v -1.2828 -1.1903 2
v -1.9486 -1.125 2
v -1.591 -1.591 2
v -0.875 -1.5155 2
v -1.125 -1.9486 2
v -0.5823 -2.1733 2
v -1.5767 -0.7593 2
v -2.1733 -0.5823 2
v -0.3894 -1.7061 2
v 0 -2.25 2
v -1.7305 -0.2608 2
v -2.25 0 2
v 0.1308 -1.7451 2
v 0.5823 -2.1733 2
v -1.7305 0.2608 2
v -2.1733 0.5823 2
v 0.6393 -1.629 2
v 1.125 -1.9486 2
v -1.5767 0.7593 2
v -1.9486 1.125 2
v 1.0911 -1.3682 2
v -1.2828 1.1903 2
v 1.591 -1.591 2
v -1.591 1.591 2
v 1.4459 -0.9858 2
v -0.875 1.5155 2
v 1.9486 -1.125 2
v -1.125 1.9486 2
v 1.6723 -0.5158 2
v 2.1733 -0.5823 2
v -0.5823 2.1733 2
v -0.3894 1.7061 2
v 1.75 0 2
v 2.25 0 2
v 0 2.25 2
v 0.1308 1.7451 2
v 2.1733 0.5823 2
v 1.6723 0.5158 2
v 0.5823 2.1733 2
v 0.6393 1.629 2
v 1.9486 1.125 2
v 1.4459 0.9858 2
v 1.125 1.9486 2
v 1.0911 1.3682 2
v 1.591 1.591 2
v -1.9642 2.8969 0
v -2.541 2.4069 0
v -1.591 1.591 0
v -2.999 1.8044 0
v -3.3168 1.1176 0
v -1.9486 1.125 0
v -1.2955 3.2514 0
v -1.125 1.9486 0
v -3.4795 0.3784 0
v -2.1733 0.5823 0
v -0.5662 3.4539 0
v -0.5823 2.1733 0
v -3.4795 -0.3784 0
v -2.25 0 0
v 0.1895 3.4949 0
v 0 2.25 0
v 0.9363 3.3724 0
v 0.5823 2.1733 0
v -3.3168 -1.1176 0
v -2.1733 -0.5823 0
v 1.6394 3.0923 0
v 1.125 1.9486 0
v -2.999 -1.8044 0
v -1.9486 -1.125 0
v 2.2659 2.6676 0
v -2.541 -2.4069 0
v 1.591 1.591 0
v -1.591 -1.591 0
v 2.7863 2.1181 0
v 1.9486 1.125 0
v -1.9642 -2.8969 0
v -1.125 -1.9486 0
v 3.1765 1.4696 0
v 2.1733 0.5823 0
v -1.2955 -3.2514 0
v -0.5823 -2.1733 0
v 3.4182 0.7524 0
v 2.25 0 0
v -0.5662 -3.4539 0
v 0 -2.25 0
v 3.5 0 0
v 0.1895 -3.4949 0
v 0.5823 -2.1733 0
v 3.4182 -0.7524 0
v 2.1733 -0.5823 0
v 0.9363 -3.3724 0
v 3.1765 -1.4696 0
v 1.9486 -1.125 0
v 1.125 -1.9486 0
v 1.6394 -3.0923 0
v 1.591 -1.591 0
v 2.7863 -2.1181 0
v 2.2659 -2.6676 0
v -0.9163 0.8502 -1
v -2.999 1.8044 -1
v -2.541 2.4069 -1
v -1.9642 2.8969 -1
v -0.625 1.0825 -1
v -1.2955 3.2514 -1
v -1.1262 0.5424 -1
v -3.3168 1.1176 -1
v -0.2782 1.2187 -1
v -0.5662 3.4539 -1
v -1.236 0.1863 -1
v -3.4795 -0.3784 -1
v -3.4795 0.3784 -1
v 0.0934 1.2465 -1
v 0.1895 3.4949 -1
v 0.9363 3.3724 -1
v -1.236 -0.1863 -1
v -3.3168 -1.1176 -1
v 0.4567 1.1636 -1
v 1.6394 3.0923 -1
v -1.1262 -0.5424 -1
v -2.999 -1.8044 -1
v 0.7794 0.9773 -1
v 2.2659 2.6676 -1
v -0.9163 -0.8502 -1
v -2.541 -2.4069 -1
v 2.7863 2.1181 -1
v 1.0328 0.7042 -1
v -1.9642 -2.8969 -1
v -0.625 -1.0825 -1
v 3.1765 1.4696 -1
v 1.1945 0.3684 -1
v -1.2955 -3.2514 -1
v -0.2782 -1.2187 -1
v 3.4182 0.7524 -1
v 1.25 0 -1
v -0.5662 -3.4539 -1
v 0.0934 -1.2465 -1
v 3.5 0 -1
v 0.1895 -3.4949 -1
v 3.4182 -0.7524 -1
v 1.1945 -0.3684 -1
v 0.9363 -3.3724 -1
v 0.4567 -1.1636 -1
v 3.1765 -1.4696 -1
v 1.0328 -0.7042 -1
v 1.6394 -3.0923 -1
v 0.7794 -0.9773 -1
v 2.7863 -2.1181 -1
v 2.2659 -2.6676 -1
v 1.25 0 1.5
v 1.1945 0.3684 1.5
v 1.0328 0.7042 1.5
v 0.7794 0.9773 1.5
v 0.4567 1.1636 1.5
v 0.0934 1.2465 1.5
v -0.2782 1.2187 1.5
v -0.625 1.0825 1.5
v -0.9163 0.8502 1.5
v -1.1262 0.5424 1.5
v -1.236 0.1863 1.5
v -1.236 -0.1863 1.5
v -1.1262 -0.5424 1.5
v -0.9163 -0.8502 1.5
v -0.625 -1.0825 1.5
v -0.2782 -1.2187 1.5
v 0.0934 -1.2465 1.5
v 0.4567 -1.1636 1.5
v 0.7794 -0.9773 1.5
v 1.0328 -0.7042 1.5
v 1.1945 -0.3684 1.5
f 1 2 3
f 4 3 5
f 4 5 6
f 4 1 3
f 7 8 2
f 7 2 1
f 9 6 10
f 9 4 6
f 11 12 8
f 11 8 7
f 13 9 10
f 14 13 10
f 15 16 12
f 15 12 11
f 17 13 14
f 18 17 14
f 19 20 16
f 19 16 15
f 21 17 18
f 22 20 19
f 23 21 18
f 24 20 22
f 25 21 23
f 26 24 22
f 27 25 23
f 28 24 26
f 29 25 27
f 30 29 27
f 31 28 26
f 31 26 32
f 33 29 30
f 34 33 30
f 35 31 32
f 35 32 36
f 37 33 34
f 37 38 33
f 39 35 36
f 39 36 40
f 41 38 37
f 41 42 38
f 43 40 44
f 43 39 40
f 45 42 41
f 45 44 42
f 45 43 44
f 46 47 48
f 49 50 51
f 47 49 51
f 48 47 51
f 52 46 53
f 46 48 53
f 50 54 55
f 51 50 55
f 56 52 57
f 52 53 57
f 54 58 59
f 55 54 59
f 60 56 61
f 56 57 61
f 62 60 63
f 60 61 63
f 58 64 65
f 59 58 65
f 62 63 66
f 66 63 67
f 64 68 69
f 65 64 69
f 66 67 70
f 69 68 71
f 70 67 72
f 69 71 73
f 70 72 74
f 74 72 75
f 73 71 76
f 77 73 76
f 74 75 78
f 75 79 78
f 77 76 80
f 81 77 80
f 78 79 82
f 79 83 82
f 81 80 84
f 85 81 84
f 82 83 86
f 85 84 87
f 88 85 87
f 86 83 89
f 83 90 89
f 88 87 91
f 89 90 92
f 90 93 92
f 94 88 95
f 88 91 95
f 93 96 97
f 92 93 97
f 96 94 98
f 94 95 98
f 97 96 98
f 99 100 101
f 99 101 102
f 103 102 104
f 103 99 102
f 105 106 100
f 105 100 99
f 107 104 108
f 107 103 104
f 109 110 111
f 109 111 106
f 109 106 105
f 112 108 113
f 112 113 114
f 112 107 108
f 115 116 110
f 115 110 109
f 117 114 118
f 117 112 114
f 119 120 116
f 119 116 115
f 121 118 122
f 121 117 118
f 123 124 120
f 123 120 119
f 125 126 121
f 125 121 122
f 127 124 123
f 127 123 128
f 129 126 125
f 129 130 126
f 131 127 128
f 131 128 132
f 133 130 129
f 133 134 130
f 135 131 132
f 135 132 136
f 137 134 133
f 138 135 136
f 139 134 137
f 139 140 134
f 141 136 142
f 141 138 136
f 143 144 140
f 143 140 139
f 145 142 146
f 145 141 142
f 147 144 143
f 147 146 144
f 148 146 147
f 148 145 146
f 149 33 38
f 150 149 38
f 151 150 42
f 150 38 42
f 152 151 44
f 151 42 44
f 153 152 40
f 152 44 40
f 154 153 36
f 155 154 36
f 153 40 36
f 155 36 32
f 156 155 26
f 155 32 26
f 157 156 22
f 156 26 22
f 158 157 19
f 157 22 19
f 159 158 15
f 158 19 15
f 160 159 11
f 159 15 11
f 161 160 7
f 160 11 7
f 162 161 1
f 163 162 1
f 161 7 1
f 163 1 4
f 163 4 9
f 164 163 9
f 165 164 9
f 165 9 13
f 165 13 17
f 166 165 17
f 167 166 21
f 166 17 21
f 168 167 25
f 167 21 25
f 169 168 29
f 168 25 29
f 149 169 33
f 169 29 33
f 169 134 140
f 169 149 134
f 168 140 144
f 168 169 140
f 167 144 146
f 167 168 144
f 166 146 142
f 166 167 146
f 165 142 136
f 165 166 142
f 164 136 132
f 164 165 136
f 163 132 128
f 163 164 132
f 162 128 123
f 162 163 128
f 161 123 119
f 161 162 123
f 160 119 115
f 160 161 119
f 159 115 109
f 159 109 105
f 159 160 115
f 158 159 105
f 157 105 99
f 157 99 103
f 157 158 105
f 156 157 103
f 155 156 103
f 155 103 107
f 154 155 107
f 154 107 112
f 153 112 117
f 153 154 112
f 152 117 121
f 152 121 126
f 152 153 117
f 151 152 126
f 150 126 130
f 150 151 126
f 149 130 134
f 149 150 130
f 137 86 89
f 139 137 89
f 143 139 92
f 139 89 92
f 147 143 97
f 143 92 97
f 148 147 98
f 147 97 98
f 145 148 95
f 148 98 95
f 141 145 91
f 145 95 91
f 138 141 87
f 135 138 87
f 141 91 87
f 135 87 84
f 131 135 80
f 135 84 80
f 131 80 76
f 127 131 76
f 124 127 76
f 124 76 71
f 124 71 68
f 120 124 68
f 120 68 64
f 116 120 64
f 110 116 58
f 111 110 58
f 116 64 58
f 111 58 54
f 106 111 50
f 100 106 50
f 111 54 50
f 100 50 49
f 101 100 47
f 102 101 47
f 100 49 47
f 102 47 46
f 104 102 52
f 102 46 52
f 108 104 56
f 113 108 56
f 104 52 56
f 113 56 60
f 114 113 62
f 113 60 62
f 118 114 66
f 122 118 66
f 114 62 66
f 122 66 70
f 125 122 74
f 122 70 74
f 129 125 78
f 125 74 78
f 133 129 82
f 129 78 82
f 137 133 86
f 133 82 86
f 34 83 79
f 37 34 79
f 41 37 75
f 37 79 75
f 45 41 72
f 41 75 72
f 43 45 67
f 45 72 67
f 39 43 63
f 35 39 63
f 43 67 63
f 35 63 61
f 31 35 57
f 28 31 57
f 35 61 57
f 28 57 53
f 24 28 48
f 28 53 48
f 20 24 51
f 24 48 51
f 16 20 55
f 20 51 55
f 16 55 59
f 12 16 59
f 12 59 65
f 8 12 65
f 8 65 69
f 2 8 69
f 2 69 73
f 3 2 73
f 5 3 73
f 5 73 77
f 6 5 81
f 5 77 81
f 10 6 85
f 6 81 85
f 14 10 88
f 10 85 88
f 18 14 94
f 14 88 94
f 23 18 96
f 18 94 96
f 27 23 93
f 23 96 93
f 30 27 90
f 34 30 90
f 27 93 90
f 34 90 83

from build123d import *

# Parameters (mm, degrees)
F0_R     = 2.25
F0_R_2   = 1.25
F1_DEPTH = 2
F2_SIZE  = 0.5
F3_R     = 3.5
F3_R_2   = 1.25
F4_DEPTH = 1


with BuildPart() as f1:
    # F0 (on Top) → F1 (new body)
    with BuildSketch(Plane.XY):
        Circle(F0_R)
        Circle(F0_R_2, mode=Mode.SUBTRACT)
    extrude(amount=F1_DEPTH)

    # F2
    f2_edges = [f1.edges().sort_by_distance(p)[0] for p in [
        (-1.25, 0, 2),
    ]]
    chamfer(f2_edges, length=F2_SIZE)

    # F3 (on face) → F4 (join)
    with BuildSketch(Plane(origin=(0, 0, 0), x_dir=(1, 0, 0), z_dir=(0, 0, -1))):
        Circle(F3_R)
        Circle(F3_R_2, mode=Mode.SUBTRACT)
    extrude(amount=F4_DEPTH)


solid = f1.part
